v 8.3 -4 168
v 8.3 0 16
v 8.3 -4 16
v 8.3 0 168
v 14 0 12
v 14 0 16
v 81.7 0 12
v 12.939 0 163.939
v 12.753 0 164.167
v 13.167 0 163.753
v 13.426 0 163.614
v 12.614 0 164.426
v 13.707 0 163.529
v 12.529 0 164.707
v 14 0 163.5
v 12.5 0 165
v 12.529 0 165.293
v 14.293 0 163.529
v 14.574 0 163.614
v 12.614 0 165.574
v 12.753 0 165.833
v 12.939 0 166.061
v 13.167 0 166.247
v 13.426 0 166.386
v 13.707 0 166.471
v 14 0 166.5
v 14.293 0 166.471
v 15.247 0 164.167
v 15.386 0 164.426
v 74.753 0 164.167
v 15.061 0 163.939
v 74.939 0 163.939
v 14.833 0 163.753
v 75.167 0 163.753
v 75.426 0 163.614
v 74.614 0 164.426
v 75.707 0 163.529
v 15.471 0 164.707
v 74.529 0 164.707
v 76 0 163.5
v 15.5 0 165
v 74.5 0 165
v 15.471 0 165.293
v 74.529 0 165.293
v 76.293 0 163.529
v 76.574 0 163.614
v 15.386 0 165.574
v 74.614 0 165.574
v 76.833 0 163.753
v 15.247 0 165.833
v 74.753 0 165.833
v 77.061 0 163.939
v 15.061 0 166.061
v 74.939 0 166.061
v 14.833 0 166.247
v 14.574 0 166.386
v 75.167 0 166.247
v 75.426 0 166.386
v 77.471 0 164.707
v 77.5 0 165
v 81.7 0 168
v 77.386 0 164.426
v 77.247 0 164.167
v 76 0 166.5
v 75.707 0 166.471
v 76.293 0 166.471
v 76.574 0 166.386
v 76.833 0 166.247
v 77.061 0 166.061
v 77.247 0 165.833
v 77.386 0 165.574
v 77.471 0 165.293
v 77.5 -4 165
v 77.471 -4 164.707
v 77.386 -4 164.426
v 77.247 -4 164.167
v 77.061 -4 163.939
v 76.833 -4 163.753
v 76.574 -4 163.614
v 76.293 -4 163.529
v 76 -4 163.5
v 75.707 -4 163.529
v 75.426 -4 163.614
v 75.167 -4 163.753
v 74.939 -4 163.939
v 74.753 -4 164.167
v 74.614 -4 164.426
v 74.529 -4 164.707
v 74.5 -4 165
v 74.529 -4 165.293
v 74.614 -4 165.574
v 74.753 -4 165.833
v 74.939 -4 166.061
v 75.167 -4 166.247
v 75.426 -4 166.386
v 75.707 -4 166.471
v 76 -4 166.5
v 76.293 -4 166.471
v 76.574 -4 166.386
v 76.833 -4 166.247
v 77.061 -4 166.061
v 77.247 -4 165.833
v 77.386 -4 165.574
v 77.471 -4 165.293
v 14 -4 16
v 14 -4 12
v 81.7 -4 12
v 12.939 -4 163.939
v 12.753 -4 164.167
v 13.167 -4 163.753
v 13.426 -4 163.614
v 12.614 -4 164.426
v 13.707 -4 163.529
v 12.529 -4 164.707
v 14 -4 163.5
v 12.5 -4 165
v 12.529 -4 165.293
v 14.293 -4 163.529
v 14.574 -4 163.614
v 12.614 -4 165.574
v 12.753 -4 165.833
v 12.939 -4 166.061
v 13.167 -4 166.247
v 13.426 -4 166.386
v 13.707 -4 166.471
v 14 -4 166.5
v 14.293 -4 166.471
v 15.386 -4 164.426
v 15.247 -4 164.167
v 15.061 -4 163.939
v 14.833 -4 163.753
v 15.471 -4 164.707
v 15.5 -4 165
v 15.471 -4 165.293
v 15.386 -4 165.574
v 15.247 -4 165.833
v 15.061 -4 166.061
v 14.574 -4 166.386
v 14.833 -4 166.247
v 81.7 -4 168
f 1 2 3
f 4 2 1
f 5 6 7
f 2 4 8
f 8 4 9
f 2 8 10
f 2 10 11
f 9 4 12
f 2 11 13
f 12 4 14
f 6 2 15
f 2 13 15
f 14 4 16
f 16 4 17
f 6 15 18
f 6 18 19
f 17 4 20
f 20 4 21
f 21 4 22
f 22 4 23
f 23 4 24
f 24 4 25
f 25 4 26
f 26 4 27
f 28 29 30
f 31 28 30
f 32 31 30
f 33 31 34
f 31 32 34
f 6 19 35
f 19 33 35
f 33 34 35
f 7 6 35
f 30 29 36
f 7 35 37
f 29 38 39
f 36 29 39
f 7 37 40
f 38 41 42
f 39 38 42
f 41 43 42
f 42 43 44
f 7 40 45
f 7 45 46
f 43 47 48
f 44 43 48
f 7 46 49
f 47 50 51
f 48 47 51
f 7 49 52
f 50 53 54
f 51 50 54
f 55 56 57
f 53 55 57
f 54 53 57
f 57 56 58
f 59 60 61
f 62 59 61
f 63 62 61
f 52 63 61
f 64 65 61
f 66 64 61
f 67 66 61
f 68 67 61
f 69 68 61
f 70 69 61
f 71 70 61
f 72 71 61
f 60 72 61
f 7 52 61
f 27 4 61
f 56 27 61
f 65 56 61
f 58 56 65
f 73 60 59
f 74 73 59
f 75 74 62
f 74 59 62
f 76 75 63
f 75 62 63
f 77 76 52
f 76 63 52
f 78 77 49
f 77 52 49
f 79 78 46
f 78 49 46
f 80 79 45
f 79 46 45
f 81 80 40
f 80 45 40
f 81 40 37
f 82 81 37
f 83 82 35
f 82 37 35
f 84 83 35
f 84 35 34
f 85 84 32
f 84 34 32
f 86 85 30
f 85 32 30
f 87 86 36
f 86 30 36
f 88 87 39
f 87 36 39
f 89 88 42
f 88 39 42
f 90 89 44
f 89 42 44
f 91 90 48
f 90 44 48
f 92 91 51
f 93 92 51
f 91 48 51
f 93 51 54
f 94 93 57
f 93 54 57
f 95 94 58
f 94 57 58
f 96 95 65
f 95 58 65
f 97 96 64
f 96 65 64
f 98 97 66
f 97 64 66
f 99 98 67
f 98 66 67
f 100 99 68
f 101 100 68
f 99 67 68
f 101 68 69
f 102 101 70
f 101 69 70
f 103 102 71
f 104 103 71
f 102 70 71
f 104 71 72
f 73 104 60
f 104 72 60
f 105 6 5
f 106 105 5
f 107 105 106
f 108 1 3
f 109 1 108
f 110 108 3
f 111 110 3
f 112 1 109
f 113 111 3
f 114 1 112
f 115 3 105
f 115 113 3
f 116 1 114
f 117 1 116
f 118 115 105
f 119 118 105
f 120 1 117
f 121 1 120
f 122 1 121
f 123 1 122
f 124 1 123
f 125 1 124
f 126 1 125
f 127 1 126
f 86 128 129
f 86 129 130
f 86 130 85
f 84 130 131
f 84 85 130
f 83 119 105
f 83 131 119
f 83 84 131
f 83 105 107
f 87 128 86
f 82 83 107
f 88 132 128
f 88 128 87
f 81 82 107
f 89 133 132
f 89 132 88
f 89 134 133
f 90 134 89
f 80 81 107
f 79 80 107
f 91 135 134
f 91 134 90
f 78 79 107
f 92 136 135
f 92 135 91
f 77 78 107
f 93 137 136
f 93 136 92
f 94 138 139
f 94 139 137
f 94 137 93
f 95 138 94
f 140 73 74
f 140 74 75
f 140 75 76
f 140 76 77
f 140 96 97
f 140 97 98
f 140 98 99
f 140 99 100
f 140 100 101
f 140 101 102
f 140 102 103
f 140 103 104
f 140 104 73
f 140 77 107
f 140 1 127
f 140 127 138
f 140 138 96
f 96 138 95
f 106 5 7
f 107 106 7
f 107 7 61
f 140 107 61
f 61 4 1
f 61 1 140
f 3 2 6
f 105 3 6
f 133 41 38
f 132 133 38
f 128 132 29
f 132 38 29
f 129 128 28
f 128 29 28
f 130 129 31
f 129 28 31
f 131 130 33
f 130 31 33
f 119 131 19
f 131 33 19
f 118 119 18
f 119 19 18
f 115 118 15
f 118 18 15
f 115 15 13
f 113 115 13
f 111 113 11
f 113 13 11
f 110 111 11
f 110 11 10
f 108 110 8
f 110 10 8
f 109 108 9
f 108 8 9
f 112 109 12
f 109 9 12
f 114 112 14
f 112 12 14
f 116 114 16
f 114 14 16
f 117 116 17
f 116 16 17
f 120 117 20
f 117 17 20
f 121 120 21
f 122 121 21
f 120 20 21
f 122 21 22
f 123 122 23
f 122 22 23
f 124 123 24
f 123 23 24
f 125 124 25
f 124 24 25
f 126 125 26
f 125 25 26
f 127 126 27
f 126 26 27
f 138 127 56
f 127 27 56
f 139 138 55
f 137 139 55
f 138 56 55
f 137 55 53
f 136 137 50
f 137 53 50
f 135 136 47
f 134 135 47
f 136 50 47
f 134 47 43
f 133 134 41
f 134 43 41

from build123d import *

# Parameters (mm, degrees)
SKETCH030_W     = 73.4
SKETCH030_H     = 156
PAD008_DEPTH    = 4
SKETCH031_R     = 1.5
POCKET014_DEPTH = 4
SKETCH032_W     = 14
SKETCH032_H     = 16
POCKET015_DEPTH = 5


with BuildPart() as part:
    # Sketch030 → Pad008 (new body)
    with BuildSketch(Plane.XZ):
        with Locations((45, 90)):
            Rectangle(SKETCH030_W, SKETCH030_H)
    extrude(amount=PAD008_DEPTH)

    # Sketch031 (on Face5 of Pad008) → Pocket014 (cut)
    with BuildSketch(Plane(origin=(0, 0, 0), x_dir=(1, 0, 0), z_dir=(0, 1, 0))):
        with Locations((14, -165)):
            Circle(SKETCH031_R)
        with Locations((76, -165)):
            Circle(SKETCH031_R)
    extrude(amount=-POCKET014_DEPTH, mode=Mode.SUBTRACT)

    # Sketch032 (on Face4 of Pocket014) → Pocket015 (cut)
    with BuildSketch(Plane(origin=(0, 0, 0), x_dir=(1, 0, 0), z_dir=(0, 1, 0))):
        with Locations((7, -8)):
            Rectangle(SKETCH032_W, SKETCH032_H)
    extrude(amount=-POCKET015_DEPTH, mode=Mode.SUBTRACT)


solid = part.part
